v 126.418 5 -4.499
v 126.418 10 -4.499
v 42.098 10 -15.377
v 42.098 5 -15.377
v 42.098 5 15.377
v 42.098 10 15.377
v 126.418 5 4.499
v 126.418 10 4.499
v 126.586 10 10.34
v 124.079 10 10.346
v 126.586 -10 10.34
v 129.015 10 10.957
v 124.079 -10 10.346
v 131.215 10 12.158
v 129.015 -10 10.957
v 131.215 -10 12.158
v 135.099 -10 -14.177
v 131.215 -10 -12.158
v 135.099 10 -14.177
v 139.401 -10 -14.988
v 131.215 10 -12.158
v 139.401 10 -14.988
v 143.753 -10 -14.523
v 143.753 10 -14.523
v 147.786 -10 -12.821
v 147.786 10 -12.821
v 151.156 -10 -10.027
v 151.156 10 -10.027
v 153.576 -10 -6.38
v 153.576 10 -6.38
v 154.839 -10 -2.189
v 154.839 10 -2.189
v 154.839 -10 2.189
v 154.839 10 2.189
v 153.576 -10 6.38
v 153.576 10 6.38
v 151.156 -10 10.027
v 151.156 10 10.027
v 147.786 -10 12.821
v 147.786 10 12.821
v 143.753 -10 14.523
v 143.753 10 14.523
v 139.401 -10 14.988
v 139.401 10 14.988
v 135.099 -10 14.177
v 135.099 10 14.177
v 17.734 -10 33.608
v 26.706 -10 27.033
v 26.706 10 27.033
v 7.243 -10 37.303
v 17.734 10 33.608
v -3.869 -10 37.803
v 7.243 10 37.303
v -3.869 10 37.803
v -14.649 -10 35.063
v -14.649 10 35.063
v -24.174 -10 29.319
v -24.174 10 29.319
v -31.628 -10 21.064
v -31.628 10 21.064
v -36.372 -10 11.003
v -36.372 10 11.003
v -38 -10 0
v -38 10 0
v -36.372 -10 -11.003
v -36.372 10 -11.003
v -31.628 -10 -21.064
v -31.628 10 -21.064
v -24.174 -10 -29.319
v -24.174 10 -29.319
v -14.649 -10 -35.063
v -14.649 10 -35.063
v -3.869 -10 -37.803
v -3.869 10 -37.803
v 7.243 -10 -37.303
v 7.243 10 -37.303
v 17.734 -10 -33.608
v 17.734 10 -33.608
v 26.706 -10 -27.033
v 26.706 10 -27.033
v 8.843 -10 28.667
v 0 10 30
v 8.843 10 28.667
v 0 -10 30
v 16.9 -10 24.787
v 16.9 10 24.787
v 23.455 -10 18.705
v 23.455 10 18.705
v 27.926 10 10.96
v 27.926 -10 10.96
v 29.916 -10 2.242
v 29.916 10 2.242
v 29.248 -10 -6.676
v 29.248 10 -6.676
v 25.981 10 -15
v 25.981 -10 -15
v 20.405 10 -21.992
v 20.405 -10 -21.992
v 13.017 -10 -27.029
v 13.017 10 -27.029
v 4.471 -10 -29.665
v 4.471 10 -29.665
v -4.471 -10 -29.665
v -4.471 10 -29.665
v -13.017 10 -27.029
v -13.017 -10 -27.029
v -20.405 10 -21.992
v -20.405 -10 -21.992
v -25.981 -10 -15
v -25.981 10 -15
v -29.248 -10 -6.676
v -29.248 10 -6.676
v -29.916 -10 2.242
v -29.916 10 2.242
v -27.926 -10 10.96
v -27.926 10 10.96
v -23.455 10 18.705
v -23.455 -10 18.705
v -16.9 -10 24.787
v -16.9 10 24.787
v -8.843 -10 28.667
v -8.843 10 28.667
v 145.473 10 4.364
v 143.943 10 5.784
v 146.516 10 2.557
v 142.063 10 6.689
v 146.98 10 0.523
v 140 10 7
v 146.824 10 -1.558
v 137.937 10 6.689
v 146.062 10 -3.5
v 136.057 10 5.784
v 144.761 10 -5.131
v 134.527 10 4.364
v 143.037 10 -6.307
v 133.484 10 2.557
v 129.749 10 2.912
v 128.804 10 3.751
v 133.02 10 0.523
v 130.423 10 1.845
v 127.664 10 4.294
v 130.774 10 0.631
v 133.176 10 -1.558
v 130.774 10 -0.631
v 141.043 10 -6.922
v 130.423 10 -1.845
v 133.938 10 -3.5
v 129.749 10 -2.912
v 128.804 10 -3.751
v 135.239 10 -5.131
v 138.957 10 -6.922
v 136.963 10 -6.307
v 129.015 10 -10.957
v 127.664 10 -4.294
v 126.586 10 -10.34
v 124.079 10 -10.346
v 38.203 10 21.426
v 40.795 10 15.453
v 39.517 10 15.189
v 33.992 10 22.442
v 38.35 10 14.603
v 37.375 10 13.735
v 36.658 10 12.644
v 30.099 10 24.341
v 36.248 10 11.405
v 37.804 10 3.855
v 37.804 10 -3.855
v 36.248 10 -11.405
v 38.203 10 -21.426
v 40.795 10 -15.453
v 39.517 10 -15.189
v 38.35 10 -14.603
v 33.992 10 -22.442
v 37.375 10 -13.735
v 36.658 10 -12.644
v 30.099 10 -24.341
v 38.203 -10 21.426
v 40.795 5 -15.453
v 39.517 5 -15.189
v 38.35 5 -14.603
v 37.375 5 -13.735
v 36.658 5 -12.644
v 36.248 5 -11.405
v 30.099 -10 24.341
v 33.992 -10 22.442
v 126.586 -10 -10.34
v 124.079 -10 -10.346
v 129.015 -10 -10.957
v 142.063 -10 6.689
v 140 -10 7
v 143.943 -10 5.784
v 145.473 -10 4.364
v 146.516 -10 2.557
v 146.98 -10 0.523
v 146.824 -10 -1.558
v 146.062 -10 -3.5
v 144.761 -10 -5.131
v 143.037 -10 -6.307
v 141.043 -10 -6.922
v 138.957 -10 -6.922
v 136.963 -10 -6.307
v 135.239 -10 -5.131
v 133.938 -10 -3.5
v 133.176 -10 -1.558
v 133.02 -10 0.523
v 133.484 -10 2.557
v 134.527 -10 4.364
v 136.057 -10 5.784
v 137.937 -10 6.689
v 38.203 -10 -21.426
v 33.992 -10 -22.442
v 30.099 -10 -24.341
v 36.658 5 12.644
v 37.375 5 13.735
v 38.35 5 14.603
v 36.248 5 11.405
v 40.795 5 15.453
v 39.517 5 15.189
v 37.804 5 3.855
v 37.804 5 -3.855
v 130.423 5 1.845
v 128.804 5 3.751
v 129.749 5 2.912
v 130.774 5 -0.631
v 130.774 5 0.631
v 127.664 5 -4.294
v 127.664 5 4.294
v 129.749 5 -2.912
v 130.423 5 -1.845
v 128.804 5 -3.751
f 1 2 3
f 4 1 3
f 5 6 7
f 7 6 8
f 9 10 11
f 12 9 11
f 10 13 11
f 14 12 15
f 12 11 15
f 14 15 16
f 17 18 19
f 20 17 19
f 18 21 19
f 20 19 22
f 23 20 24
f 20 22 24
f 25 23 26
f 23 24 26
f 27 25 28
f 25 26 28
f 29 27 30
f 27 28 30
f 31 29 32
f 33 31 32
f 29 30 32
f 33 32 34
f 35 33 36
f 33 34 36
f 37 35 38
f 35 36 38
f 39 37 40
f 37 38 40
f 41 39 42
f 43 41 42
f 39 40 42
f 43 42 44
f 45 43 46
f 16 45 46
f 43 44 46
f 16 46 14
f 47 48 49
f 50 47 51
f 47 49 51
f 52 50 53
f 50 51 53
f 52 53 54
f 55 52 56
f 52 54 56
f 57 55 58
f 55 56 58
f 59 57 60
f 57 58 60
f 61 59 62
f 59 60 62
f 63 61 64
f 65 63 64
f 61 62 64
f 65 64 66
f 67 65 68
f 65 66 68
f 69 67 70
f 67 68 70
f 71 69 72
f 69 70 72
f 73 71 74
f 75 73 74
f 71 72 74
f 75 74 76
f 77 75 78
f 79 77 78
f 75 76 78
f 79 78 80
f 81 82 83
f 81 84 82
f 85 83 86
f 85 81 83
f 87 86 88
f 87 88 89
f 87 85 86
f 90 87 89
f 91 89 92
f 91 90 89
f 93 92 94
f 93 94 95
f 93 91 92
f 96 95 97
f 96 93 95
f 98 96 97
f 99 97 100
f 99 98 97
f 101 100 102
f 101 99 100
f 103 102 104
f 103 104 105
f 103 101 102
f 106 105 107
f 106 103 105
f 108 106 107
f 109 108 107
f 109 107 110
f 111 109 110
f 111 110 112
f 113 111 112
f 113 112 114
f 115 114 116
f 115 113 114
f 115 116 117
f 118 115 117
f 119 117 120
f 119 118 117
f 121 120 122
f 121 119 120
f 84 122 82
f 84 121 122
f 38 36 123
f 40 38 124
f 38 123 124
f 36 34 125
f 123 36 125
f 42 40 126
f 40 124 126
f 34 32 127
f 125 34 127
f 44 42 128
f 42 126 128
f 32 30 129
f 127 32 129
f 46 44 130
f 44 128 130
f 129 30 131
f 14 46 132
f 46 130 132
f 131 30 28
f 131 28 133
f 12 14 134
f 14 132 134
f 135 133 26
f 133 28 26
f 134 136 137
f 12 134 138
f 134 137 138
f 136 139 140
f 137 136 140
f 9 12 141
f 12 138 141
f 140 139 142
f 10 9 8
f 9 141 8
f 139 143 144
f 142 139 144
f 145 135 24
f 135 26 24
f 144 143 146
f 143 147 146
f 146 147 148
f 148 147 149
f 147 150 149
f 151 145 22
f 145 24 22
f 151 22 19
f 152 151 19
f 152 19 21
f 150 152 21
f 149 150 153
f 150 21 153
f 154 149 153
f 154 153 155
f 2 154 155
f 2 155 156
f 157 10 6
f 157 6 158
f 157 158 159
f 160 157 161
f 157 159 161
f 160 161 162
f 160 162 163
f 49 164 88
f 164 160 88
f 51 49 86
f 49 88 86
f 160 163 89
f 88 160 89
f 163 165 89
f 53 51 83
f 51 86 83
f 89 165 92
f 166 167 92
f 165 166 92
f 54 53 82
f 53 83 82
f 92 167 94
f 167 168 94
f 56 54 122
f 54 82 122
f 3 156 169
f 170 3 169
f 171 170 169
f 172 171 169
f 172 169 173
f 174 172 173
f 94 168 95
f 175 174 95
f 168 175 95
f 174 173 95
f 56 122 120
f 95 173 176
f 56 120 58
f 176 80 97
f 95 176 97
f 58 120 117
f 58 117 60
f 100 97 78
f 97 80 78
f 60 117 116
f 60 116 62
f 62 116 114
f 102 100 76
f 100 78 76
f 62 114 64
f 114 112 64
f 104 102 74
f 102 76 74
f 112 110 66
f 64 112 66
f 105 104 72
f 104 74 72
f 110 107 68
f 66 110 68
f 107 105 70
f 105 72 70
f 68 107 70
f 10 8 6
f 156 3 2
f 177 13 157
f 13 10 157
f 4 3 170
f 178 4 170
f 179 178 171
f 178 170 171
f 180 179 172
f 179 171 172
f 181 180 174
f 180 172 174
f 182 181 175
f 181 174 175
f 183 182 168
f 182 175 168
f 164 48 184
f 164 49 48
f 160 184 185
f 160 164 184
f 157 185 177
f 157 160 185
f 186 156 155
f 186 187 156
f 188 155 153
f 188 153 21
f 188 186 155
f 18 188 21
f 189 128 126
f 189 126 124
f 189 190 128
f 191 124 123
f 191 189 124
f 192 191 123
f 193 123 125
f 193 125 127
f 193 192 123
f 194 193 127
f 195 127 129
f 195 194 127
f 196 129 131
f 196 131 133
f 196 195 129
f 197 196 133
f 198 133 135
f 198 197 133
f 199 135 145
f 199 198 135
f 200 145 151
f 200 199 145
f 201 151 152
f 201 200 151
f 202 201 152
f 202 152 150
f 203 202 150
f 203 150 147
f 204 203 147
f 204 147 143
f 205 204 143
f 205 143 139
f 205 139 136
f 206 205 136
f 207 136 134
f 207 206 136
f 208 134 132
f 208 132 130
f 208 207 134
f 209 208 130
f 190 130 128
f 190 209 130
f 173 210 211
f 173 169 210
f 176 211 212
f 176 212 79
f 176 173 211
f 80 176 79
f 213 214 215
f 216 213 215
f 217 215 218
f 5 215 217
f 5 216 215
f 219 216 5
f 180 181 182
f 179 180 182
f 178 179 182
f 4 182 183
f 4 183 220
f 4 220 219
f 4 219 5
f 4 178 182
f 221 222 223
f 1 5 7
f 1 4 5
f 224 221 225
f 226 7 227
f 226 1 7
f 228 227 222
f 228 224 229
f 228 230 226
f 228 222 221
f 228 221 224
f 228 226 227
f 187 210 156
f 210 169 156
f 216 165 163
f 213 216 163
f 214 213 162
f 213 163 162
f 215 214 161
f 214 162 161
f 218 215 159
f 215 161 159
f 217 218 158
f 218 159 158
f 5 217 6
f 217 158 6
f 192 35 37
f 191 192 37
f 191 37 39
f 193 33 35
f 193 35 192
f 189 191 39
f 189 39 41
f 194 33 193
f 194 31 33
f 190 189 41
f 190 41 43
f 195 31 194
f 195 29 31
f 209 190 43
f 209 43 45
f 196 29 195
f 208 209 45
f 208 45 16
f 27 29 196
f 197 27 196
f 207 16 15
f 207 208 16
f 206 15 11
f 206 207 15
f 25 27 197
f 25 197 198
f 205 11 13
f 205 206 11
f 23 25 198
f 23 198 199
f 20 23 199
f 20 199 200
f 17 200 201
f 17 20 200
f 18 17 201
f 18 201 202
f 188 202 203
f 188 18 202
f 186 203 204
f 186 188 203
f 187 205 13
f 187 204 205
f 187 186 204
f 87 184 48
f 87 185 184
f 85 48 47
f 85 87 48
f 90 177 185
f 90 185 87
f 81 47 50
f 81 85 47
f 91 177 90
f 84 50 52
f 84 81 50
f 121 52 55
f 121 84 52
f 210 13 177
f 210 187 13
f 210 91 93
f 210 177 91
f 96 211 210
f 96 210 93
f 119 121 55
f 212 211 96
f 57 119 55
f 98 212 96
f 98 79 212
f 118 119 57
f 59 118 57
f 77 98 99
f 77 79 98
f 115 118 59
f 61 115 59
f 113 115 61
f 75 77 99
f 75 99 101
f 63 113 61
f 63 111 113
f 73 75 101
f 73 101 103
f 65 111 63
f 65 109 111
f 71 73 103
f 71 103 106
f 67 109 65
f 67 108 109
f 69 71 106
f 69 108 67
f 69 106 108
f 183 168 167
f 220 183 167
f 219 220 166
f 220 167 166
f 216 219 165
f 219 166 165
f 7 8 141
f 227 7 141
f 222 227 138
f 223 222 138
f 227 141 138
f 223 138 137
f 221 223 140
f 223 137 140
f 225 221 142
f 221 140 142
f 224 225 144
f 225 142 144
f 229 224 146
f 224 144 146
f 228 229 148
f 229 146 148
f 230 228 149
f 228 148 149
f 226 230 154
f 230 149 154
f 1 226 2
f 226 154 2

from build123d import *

# Parameters (mm, degrees)
SKETCH1_R           = 30
SKETCH1_R_2         = 7
BOSS_EXTRUDE1_DEPTH = 10
FILLET1_R           = 10
FILLET2_R           = 20
CUT_EXTRUDE1_START  = 10
CUT_EXTRUDE1_DEPTH  = 5


with BuildPart() as part:
    # Sketch1 → Boss-Extrude1 (new, symmetric)
    with BuildSketch(Plane(origin=(0, 0, 0), x_dir=(1, 0, 0), z_dir=(0, 1, 0))):
        with BuildLine():
            Line((30.700703589, 22.393454382), (128.610913115, 9.761593104))
            ThreePointArc((128.610913115, 9.761593104), (155, 0), (128.610913115, -9.761593104))
            Line((128.610913115, -9.761593104), (30.700703589, -22.393454382))
            ThreePointArc((30.700703589, -22.393454382), (-38, 0), (30.700703589, 22.393454382))
        make_face()
        with Locations(Location((0, 0, 0), (0, 0, 270))):
            Circle(SKETCH1_R, mode=Mode.SUBTRACT)
        with Locations(Location((140, 0, 0), (0, 0, 270))):
            Circle(SKETCH1_R_2, mode=Mode.SUBTRACT)
    extrude(amount=BOSS_EXTRUDE1_DEPTH, both=True)

    # Fillet1
    fillet1_edges = [part.edges().sort_by_distance(p)[0] for p in [
        (128.610913115, 0, -9.761593104),
        (128.610913115, 0, 9.761593104),
    ]]
    fillet(fillet1_edges, radius=FILLET1_R)

    # Fillet2
    fillet2_edges = [part.edges().sort_by_distance(p)[0] for p in [
        (30.700703589, 0, -22.393454382),
        (30.700703589, 0, 22.393454382),
    ]]
    fillet(fillet2_edges, radius=FILLET2_R)

    # Sketch2 → Cut-Extrude1 (cut)
    with BuildSketch(Plane(origin=(0, 0, 0), x_dir=(1, 0, 0), z_dir=(0, 1, 0)).offset(CUT_EXTRUDE1_START)):
        with BuildLine():
            Line((42.097828348, -15.377472859), (126.418285087, -4.498890149))
            ThreePointArc((126.418285087, -4.498890149), (130.818347989, 0), (126.418285087, 4.498890149))
            Line((126.418285087, 4.498890149), (42.097828348, 15.377472859))
            ThreePointArc((42.097828348, 15.377472859), (38.350242622, 14.602706981), (36.248141548, 11.404921495))
            ThreePointArc((36.248141548, 11.404921495), (38, 0), (36.248141548, -11.404921495))
            ThreePointArc((36.248141548, -11.404921495), (38.350242622, -14.602706981), (42.097828348, -15.377472859))
        make_face()
    extrude(amount=-CUT_EXTRUDE1_DEPTH, mode=Mode.SUBTRACT)


solid = part.part
